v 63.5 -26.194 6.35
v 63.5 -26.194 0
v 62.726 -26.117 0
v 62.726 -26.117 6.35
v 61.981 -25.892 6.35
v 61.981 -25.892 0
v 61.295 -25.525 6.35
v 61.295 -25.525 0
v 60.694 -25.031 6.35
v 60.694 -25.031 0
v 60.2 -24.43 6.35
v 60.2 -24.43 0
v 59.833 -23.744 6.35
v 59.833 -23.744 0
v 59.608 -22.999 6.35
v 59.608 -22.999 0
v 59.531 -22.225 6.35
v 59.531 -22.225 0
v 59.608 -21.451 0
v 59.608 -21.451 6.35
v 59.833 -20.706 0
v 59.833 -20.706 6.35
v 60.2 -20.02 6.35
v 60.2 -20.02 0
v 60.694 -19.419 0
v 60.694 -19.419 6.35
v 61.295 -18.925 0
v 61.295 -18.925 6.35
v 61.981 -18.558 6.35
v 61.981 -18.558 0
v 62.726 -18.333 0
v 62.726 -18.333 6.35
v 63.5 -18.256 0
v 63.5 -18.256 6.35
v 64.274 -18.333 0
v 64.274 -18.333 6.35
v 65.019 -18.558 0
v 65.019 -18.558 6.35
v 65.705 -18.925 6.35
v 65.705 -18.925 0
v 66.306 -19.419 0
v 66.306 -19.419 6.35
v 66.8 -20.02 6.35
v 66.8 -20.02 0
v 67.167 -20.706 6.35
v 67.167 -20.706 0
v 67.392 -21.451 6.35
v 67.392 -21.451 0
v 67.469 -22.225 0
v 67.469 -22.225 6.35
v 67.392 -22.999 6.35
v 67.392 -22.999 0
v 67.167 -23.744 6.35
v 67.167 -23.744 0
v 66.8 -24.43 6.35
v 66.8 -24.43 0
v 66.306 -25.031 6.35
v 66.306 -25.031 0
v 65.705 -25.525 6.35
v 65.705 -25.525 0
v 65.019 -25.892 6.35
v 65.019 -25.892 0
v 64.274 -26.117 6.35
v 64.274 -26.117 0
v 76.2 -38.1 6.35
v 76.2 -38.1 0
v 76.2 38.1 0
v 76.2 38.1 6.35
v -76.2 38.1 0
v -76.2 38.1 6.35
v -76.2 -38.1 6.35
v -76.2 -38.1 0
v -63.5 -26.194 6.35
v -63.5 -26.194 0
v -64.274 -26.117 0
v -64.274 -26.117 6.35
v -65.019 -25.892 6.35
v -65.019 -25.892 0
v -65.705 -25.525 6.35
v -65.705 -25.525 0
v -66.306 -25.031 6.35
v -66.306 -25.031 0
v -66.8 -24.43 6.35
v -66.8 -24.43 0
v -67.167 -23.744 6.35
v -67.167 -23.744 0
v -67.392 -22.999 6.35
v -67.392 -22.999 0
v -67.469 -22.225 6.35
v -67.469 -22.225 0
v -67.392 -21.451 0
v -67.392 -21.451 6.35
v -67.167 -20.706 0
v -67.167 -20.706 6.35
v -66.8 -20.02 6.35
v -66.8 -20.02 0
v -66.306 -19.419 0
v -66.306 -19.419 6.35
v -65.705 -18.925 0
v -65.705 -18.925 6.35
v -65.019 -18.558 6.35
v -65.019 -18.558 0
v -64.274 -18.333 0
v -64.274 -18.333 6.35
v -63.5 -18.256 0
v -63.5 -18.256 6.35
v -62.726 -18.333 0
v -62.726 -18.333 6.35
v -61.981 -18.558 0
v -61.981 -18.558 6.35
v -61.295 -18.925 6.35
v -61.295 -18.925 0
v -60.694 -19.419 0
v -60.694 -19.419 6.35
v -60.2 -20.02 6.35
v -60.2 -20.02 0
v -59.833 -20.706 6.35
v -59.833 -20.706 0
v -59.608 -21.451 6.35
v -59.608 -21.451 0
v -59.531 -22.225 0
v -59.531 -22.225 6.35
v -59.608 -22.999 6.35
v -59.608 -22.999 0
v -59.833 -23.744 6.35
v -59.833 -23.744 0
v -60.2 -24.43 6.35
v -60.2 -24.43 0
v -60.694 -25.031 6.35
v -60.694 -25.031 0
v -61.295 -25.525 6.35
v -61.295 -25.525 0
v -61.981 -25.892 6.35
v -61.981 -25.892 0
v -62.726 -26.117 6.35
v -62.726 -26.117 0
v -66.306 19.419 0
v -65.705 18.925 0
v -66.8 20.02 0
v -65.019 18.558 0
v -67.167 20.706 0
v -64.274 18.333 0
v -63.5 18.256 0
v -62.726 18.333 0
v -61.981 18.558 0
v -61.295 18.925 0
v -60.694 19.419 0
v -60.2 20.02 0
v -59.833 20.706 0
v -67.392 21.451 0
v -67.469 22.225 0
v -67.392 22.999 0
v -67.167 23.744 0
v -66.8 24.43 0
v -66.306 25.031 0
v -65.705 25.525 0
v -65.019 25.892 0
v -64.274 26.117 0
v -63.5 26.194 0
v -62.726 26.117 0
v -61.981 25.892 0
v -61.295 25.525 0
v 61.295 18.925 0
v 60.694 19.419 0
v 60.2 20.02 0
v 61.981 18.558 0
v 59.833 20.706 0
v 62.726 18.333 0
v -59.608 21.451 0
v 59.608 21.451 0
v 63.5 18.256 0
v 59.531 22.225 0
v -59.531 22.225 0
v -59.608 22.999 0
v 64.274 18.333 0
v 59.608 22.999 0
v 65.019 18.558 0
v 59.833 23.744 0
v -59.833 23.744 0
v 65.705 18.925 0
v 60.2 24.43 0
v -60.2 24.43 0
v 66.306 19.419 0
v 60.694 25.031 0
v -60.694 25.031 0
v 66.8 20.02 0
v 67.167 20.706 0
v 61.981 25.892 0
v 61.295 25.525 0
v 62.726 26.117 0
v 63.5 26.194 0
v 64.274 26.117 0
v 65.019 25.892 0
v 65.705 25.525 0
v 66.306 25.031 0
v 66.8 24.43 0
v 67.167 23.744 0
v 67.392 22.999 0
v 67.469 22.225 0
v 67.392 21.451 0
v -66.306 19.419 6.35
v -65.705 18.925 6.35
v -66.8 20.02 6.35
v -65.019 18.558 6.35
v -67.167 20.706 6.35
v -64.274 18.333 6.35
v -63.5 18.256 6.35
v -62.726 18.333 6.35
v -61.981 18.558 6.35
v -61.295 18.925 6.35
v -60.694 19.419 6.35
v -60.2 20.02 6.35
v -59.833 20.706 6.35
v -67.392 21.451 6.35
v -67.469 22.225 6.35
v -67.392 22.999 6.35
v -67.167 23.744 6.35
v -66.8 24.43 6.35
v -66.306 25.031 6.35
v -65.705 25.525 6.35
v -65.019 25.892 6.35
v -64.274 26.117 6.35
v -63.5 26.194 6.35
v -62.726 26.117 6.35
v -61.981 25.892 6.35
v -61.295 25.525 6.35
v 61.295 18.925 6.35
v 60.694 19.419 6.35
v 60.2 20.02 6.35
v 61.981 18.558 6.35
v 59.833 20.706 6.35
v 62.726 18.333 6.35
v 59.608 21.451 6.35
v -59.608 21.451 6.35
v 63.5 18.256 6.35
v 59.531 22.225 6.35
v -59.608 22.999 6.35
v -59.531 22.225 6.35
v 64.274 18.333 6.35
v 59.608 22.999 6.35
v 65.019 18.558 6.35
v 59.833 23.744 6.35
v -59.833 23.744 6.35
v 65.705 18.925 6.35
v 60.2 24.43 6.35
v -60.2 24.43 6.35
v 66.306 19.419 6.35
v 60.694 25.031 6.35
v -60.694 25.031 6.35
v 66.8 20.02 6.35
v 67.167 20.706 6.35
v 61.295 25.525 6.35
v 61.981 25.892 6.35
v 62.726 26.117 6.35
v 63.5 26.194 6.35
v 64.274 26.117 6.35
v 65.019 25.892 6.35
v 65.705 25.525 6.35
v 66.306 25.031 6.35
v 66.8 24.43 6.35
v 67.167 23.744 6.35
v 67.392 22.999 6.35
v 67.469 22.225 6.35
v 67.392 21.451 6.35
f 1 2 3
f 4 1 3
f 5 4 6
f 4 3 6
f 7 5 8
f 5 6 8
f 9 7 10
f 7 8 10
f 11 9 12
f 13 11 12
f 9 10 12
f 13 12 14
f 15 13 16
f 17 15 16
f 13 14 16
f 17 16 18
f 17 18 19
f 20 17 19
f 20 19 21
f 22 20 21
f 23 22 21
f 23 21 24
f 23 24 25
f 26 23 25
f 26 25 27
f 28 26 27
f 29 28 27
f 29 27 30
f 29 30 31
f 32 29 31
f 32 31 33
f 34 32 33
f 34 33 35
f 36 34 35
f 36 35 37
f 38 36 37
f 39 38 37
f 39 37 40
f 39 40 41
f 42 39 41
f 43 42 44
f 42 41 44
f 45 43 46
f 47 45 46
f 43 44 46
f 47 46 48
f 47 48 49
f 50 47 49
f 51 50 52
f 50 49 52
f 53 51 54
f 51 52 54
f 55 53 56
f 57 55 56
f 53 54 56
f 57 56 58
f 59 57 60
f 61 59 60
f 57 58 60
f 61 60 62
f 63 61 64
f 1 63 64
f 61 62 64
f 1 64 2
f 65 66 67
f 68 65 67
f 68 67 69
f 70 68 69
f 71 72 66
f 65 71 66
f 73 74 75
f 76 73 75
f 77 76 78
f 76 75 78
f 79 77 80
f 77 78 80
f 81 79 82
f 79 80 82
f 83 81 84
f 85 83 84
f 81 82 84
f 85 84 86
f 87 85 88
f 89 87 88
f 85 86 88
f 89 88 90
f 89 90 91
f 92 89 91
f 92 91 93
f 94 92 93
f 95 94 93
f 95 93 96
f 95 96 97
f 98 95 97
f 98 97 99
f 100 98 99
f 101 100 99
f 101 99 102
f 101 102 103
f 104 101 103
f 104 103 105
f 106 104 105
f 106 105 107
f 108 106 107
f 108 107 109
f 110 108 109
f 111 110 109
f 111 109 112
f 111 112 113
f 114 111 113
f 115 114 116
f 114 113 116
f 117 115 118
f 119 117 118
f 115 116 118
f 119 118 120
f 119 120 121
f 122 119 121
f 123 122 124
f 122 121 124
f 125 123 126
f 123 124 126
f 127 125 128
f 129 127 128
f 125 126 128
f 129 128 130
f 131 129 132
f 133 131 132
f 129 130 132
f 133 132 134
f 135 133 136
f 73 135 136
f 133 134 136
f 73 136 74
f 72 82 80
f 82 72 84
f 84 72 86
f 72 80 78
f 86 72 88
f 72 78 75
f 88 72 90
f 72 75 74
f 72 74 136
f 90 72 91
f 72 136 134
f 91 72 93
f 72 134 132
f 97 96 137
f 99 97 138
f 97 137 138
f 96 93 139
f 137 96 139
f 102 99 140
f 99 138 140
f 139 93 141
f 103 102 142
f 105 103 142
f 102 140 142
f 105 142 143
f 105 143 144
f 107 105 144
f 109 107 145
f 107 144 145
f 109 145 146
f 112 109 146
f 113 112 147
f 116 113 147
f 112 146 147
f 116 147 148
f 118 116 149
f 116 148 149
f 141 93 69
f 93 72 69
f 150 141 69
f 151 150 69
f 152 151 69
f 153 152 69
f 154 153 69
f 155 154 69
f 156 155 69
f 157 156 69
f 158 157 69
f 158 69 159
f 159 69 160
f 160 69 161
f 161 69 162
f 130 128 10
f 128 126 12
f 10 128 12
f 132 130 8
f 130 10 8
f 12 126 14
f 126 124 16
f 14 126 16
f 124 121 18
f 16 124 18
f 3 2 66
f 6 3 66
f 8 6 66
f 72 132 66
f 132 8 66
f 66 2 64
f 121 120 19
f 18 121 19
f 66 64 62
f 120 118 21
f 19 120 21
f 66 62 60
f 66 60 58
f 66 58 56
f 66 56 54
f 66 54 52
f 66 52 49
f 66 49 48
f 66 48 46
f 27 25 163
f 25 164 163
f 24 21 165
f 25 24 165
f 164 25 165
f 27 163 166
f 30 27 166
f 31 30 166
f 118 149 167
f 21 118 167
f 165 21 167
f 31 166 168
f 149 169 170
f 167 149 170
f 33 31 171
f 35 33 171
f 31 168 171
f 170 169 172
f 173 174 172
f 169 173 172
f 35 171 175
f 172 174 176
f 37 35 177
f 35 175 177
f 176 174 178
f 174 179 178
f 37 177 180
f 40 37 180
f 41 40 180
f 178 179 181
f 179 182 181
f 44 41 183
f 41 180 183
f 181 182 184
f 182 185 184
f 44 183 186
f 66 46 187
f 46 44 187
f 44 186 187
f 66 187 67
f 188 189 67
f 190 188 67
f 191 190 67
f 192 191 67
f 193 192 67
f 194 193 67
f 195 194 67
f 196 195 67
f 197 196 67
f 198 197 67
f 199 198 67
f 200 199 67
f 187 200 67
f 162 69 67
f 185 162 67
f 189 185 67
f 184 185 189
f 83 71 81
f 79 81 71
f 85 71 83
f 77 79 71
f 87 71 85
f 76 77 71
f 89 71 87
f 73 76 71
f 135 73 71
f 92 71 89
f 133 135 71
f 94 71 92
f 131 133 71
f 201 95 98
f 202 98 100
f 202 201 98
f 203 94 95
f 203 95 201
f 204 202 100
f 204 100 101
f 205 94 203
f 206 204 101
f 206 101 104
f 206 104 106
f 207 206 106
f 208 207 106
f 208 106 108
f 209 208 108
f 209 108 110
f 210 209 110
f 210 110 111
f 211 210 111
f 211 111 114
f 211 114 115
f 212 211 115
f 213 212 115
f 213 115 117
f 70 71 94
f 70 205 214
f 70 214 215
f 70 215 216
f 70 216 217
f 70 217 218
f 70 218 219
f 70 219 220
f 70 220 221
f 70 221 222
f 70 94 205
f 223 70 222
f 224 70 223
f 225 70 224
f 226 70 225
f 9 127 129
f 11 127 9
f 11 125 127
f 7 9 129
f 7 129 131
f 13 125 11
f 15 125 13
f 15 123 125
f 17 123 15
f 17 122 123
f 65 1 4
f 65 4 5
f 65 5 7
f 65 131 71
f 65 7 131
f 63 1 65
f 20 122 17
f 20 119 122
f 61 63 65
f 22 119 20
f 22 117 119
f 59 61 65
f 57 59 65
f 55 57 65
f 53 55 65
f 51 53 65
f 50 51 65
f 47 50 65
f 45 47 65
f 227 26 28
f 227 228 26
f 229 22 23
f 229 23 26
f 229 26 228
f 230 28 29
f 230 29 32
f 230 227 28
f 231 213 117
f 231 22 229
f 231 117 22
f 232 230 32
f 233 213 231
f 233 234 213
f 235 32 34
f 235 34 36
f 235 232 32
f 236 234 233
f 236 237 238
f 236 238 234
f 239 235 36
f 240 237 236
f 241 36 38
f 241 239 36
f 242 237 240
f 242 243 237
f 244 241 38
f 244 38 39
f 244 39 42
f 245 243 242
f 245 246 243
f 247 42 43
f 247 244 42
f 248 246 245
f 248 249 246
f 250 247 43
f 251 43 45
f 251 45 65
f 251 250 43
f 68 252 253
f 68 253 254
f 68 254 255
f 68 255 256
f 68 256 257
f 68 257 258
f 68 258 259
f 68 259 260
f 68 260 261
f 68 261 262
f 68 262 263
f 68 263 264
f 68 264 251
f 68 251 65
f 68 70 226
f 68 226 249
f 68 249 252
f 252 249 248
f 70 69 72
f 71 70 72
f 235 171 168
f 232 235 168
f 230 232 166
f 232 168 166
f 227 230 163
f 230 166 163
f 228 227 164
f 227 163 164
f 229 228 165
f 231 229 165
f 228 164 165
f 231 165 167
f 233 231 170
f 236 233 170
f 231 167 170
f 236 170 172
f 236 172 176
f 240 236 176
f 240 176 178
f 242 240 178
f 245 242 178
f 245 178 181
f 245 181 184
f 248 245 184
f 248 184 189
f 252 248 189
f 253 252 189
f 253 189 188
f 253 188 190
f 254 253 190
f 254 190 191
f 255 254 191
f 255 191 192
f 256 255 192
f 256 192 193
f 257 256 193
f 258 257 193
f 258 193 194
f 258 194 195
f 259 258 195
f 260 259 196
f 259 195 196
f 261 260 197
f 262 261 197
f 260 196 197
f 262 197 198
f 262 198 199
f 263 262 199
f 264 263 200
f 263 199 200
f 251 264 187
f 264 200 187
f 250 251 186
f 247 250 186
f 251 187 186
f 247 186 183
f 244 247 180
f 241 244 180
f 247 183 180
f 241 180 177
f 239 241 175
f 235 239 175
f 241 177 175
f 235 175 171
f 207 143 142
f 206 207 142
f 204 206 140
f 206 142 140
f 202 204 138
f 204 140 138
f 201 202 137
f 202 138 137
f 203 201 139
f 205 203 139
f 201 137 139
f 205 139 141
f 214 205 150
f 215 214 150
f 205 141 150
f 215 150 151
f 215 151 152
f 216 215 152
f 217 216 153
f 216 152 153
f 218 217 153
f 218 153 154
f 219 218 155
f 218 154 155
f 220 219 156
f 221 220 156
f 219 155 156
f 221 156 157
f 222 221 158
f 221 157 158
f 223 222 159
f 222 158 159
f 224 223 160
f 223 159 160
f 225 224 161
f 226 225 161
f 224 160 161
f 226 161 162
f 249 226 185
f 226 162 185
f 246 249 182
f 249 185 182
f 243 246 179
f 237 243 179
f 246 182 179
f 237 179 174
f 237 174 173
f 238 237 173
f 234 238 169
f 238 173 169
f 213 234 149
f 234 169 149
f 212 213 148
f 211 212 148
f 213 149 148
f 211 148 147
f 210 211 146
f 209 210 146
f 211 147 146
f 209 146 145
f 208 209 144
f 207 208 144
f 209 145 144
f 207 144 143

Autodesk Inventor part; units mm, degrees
ref_plane "YZ Plane" through (0, 0, 0) normal (1, 0, 0) x (0, 1, 0)
ref_plane "XZ Plane" through (0, 0, 0) normal (0, 1, 0) x (-1, 0, 0)
ref_plane "XY Plane" through (0, 0, 0) normal (0, 0, 1) x (1, 0, 0)
sketch "Sketch1" plane through (0, 0, 0) normal (0, 0, 1) x (1, 0, 0)
  line L0 (-76.2, -38.1) -> (76.2, -38.1)
  line L1 (76.2, -38.1) -> (76.2, 38.1)
  line L2 (76.2, 38.1) -> (-76.2, 38.1)
  line L3 (-76.2, 38.1) -> (-76.2, -38.1)
  line L4 (-76.2, -38.1) -> (76.2, 38.1) construction
  line L5 (76.2, -38.1) -> (-76.2, 38.1) construction
  point P0 (0, 0)
  dimension "d0" = 152.4
  dimension "d1" = 76.2
extrude "Extrusion1" add sketch "Sketch1" along normal blind 6.35
sketch "Sketch2" plane through (0, 0, 6.35) normal (0, 0, 1) x (1, 0, 0)
  line L0 (63.5, 0) -> (63.5, 22.225) construction
  line L1 (63.5, 22.225) -> (63.5, -22.225) construction
  line L2 (63.5, 22.225) -> (-63.5, 22.225) construction
  line L3 (-63.5, 22.225) -> (-63.5, -22.225) construction
  line L4 (-63.5, -22.225) -> (63.5, -22.225) construction
  line L5 (63.5, -22.225) -> (63.5, 22.225) construction
  point P0 (0, 0)
  dimension "d4" = 63.5
  dimension "d7" = 127
  dimension "d16" = 44.45
  dimension "d17" = 127
  dimension "d18" = 22.225
  dimension "d19" = 63.5
hole "Hole1" at (-63.5, 22.225, 6.35) at (-63.5, -22.225, 6.35) at (63.5, -22.225, 6.35) at (63.5, 22.225, 6.35) direction (0, 0, -1) diameter 7.9375 depth 19.05 tip angle 118
equation "\"d18\" = 0.5 * d16"
equation "\"d19\" = 0.5 * d17"
properties part number "Arm Support Plate"
